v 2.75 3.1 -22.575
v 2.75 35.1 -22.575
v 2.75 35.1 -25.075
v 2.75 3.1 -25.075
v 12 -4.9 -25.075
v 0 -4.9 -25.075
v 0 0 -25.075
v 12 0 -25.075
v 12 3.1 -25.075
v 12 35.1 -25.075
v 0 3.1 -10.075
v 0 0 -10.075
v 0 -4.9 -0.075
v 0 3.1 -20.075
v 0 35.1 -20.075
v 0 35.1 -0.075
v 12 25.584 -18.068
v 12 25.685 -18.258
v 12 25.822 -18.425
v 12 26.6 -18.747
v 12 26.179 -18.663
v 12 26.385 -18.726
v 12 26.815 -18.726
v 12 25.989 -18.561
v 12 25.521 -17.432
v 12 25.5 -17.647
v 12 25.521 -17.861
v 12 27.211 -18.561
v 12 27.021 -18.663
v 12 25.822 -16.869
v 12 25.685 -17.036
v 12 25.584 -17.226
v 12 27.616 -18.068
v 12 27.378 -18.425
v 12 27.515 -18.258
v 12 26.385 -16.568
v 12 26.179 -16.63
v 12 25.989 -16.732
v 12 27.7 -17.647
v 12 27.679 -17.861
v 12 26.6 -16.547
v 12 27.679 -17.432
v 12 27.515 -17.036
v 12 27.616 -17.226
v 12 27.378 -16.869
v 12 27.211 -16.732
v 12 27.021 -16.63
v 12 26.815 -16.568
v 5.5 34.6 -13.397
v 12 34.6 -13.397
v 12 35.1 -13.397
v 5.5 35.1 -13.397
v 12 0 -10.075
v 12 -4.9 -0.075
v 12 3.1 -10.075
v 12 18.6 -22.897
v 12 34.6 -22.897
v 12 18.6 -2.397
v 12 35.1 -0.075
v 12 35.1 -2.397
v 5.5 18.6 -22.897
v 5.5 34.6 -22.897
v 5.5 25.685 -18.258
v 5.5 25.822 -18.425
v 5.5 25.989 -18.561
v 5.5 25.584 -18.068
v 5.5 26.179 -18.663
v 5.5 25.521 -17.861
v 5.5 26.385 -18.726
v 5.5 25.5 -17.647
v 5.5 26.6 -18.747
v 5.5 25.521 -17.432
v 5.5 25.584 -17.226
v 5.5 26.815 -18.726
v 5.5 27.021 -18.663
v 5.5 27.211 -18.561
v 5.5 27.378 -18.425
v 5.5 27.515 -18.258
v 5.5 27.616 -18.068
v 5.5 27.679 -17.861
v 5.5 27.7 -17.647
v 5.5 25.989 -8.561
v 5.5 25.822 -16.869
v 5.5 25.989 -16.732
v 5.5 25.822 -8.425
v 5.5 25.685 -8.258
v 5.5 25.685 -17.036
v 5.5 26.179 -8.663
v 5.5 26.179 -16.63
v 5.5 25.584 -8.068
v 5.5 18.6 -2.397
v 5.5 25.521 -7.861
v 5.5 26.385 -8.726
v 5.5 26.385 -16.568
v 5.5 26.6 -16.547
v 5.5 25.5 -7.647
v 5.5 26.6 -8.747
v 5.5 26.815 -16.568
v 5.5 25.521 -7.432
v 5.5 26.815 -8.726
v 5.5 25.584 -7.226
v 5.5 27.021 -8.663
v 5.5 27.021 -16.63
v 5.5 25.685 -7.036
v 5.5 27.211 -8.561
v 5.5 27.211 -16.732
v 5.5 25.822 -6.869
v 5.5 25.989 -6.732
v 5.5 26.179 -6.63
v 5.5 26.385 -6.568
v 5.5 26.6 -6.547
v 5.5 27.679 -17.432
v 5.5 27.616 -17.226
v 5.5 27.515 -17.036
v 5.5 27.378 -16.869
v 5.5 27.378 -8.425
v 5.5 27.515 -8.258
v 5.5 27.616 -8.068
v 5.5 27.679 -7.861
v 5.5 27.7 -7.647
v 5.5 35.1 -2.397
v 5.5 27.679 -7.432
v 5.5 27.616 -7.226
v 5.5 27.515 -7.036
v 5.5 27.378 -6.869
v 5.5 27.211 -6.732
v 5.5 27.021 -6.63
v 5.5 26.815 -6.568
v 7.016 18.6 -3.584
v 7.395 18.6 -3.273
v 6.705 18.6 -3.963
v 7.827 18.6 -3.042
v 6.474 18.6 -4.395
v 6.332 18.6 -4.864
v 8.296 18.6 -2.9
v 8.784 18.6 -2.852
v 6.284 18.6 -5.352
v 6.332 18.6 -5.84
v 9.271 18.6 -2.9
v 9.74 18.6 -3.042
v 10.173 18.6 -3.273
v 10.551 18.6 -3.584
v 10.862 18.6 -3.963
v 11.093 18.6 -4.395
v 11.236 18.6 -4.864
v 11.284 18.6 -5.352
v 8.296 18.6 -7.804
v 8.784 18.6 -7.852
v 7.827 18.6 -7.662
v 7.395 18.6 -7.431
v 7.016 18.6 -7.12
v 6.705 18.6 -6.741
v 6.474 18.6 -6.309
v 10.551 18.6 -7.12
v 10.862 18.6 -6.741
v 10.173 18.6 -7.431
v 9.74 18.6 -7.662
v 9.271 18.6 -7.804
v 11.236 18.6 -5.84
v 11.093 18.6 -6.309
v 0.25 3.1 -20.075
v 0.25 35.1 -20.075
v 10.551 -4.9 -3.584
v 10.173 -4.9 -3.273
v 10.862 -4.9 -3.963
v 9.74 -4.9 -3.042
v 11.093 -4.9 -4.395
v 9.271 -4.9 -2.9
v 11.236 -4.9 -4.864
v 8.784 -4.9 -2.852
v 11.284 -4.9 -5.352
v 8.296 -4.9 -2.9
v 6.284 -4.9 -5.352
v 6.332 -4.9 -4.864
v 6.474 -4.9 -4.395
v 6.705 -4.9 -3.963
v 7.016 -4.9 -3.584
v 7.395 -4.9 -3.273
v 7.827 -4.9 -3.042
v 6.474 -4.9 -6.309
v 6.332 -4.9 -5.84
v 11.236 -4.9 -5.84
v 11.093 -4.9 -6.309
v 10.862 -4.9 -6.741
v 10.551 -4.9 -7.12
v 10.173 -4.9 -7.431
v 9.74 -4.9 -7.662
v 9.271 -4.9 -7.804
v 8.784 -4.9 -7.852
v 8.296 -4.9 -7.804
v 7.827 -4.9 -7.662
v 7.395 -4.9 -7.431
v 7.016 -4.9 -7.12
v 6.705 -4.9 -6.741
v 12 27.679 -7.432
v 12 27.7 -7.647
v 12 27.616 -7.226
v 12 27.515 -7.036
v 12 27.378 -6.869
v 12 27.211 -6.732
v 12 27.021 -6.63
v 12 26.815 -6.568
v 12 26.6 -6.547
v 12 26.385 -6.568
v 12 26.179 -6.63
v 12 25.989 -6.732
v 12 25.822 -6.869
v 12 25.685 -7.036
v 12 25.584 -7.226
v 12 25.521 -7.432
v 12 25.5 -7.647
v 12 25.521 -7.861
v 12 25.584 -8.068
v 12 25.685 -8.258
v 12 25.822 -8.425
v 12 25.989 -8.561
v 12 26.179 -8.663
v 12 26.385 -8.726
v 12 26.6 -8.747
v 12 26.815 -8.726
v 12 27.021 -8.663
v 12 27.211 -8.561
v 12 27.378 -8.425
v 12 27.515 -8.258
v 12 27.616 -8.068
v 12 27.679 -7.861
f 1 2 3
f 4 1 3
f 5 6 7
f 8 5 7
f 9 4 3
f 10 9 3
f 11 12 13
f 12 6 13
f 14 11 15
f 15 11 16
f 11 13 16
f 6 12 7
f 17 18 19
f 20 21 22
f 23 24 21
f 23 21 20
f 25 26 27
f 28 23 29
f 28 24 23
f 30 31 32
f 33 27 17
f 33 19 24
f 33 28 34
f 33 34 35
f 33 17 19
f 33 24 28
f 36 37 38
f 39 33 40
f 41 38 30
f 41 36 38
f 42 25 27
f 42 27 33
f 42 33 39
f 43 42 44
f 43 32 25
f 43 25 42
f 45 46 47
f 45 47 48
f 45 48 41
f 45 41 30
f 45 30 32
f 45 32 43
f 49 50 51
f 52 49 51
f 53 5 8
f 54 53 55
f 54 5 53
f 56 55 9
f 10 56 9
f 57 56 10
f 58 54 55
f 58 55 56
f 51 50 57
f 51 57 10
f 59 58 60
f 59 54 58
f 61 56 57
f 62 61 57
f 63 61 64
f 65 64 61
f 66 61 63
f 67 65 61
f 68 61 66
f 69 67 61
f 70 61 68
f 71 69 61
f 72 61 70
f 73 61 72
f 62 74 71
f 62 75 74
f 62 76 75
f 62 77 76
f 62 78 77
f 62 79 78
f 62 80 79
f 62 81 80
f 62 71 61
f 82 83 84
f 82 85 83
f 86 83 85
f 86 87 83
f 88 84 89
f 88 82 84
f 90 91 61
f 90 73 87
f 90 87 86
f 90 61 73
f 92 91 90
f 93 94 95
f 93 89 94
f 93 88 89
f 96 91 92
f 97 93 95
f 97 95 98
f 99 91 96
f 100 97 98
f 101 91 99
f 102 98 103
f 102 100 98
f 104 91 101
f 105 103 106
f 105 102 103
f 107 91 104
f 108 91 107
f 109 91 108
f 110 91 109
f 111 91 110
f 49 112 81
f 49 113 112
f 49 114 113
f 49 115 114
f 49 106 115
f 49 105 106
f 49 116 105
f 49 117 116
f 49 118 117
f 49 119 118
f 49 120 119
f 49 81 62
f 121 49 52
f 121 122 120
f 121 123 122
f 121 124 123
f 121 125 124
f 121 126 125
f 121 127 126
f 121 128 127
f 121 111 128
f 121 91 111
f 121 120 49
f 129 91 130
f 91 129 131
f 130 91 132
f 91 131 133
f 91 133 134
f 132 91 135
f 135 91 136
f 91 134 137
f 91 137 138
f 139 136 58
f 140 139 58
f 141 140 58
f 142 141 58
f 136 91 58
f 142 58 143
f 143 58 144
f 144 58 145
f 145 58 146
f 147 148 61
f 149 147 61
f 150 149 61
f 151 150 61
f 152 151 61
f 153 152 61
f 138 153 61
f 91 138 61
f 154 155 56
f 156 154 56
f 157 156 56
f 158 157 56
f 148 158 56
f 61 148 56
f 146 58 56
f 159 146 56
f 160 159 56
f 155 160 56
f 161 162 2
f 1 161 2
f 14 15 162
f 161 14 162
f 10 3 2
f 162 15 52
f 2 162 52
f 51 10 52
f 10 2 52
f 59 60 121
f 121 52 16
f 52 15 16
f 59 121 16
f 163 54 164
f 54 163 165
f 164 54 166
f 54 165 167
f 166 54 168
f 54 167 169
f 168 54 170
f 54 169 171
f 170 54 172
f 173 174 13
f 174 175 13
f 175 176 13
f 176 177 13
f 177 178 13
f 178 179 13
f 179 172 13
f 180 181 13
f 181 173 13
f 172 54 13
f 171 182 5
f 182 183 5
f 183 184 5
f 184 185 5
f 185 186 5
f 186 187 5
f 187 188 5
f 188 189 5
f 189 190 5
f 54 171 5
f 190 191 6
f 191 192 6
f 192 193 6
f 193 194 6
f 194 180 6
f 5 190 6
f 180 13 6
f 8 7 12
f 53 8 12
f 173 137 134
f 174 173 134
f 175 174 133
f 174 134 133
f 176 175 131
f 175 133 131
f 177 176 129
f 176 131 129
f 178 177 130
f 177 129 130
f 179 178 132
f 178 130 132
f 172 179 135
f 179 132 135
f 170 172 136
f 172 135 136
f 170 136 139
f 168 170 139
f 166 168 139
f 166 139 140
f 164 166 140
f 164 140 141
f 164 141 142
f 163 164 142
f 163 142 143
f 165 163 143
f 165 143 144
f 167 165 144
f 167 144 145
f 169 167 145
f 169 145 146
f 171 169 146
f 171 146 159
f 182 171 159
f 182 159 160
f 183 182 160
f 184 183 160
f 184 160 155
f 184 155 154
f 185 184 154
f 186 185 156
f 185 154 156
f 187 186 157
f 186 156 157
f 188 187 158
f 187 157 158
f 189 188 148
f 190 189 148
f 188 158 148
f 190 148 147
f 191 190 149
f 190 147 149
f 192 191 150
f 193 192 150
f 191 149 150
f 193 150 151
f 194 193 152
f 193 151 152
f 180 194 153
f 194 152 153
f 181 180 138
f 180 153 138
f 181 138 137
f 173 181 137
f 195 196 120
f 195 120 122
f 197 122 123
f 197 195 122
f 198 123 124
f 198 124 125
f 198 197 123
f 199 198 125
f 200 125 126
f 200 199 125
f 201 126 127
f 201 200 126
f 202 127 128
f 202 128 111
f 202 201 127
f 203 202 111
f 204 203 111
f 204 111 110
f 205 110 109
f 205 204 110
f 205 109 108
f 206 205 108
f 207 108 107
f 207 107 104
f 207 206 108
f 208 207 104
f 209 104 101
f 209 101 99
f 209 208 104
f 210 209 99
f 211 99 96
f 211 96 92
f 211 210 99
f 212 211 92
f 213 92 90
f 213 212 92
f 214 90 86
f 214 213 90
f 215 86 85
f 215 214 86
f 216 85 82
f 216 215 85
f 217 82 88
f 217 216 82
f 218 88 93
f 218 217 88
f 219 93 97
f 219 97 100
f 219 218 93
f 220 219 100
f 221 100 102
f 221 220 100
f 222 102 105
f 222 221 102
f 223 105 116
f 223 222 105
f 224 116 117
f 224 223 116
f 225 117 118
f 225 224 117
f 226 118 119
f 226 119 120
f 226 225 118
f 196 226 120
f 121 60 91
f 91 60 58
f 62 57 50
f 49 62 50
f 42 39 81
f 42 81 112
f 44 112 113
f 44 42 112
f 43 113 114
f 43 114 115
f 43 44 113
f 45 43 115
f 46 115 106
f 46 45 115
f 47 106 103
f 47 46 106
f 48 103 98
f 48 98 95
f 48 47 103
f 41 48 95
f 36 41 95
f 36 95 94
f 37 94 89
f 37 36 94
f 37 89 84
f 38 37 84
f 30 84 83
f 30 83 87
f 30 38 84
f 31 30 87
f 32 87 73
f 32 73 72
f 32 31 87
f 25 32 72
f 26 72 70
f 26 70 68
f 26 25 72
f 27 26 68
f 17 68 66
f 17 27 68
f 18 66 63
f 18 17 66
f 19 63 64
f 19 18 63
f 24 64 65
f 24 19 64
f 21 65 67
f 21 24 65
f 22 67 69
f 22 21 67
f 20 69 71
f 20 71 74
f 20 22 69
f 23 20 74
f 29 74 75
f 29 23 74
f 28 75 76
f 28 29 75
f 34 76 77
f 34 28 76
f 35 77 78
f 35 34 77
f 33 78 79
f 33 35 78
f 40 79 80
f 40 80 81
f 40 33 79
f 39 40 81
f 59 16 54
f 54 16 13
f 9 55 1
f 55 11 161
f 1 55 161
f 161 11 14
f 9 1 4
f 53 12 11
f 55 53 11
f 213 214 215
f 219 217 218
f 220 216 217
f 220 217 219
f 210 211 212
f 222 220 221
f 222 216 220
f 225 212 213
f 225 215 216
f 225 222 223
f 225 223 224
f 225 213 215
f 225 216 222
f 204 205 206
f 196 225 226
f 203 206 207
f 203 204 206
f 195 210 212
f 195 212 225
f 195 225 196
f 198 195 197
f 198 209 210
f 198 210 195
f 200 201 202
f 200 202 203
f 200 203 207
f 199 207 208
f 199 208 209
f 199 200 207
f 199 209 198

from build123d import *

# Parameters (mm, degrees)
F1_DEPTH = 12
F2_R     = 1.1
F3_DEPTH = 6.5
F4_R     = 2.5
F5_DEPTH = 25
F7_DEPTH = 32


with BuildPart() as f1:
    # F0 (on Right) → F1 (new body)
    with BuildSketch(Plane.YZ):
        Polygon((35.1, -0.075058), (-4.9, -0.075058), (-4.9, -25.075058), (0, -25.075058), (0, -10.075058), (3.1, -10.075058), (3.1, -25.075058), (35.1, -25.075058), align=None)
    extrude(amount=F1_DEPTH)

    # F2 (on face) → F3 (cut)
    with BuildSketch(Plane.YZ.offset(12)):
        Polygon((34.6, -2.396713), (18.6, -2.396713), (18.6, -22.896713), (34.6, -22.896713), (34.6, -13.396713), (38.479045, -13.396713), (38.479045, -2.396713), align=None)
        with Locations((26.6, -17.646713)):
            Circle(F2_R, mode=Mode.SUBTRACT)
        with Locations((26.6, -7.646713)):
            Circle(F2_R, mode=Mode.SUBTRACT)
    extrude(amount=-F3_DEPTH, mode=Mode.SUBTRACT)

    # F4 (on face) → F5 (cut)
    with BuildSketch(Plane(origin=(0, 18.6, 0), x_dir=(-1, 0, 0), z_dir=(0, 1, 0))):
        with Locations((-8.783709, -5.351877)):
            Circle(F4_R)
    extrude(amount=-F5_DEPTH, mode=Mode.SUBTRACT)

    # F6 (on face) → F7 (cut, through all)
    with BuildSketch(Plane(origin=(0, 35.1, 0), x_dir=(-1, 0, 0), z_dir=(0, 1, 0))):
        Polygon((1.341271, -20.075058), (-0.25, -20.075058), (-2.75, -22.575058), (-2.75, -25.075058), (1.341271, -25.075058), align=None)
    extrude(amount=-F7_DEPTH, mode=Mode.SUBTRACT)


solid = f1.part
